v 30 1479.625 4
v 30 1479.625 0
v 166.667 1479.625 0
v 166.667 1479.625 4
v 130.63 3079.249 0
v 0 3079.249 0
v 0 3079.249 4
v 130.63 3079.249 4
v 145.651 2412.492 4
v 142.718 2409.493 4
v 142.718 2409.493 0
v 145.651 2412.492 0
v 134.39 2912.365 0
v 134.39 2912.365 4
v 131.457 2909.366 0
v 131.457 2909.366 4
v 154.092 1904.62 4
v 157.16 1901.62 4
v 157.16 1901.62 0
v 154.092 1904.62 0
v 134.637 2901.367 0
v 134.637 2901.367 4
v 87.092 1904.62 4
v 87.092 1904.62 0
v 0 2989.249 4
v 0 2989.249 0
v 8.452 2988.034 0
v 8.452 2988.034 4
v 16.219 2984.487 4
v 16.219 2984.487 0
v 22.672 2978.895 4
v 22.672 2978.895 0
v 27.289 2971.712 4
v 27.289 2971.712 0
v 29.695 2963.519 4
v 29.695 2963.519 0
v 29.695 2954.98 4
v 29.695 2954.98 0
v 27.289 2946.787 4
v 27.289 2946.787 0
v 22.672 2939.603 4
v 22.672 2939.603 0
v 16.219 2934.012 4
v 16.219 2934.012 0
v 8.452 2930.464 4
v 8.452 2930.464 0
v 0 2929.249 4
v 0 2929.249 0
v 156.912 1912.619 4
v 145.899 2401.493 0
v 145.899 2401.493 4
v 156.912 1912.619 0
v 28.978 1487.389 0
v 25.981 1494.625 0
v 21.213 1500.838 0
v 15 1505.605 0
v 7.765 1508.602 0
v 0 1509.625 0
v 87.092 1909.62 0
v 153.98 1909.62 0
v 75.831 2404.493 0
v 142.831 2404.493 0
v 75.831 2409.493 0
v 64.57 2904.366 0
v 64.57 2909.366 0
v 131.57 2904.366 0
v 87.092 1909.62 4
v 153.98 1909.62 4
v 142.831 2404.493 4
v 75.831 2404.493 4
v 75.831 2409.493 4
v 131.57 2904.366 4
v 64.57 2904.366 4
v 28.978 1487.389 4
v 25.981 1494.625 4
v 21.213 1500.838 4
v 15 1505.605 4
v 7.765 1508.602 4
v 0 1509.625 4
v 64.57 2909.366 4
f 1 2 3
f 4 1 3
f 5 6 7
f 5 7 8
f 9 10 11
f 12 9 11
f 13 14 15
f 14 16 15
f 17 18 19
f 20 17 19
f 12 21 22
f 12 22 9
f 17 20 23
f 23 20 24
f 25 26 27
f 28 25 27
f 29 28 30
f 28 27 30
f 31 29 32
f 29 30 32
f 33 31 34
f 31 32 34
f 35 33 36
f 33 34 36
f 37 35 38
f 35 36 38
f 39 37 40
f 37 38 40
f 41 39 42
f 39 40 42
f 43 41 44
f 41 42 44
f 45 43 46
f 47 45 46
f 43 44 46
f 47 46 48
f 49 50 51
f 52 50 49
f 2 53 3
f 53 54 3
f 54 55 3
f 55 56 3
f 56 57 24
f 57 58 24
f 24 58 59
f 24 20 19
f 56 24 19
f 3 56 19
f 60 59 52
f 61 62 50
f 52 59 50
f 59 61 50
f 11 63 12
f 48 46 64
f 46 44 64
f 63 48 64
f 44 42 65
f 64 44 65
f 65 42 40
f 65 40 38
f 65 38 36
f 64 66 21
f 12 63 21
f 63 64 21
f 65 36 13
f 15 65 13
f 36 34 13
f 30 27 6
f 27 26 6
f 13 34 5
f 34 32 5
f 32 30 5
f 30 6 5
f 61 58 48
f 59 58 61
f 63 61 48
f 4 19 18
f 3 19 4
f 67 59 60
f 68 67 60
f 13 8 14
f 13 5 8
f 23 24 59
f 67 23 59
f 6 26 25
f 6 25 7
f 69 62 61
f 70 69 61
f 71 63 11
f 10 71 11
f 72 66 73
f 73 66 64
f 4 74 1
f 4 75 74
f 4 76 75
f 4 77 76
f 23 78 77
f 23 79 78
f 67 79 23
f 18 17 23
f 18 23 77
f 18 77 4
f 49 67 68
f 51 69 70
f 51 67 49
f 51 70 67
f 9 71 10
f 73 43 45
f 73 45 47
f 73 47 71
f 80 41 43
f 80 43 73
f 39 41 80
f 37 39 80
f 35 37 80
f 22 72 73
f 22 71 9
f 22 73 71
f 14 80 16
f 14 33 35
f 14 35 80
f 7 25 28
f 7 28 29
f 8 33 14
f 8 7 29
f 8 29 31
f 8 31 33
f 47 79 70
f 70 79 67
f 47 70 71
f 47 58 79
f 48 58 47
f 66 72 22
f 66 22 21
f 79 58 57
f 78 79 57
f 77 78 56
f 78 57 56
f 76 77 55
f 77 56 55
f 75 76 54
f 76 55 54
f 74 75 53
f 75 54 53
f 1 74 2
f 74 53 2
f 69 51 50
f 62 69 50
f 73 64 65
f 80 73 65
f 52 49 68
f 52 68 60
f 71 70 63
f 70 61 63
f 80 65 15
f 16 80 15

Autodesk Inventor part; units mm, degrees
ref_plane "YZ Plane" through (0, 0, 0) normal (1, 0, 0) x (0, 1, 0)
ref_plane "XZ Plane" through (0, 0, 0) normal (0, 1, 0) x (-1, 0, 0)
ref_plane "XY Plane" through (0, 0, 0) normal (0, 0, 1) x (1, 0, 0)
sketch "Sketch1" plane through (0, 0, 0) normal (0, 0, 1) x (1, 0, 0)
  line L0 (0, 0) -> (0, 4438.8737)
  line L1 (0, 4438.8737) -> (100, 4438.8737)
  line L2 (100, 4438.8737) -> (200, 0)
  line L3 (200, 0) -> (0, 0)
  circle A0 centre (0, 0) radius 30
  line L4 (0, 1479.6246) -> (166.6667, 1479.6246)
  line L5 (0, 2959.2492) -> (133.3333, 2959.2492)
  circle A1 centre (0, 1479.6246) radius 30
  circle A2 centre (0, 2959.2492) radius 30
  line L6 (190.8761, 405) -> (120.8761, 405)
  line L7 (120.8761, 405) -> (120.8761, 410)
  line L8 (120.8761, 410) -> (190.8761, 410)
  line L9 (190.8761, 410) -> (190.8761, 405)
  line L10 (109.6148, 909.8732) -> (179.6148, 909.8732)
  line L11 (179.6148, 904.8732) -> (109.6148, 904.8732)
  line L12 (109.6148, 904.8732) -> (109.6148, 909.8732)
  line L13 (179.6148, 909.8732) -> (179.6148, 904.8732)
  line L14 (98.3535, 1409.7463) -> (168.3535, 1409.7463)
  line L15 (168.3535, 1404.7463) -> (98.3535, 1404.7463)
  line L16 (98.3535, 1404.7463) -> (98.3535, 1409.7463)
  line L17 (168.3535, 1409.7463) -> (168.3535, 1404.7463)
  line L18 (87.0923, 1909.6195) -> (157.0923, 1909.6195)
  line L19 (157.0923, 1904.6195) -> (87.0923, 1904.6195)
  line L20 (87.0923, 1904.6195) -> (87.0923, 1909.6195)
  line L21 (157.0923, 1909.6195) -> (157.0923, 1904.6195)
  line L22 (75.831, 2409.4927) -> (145.831, 2409.4927)
  line L23 (145.831, 2404.4927) -> (75.831, 2404.4927)
  line L24 (75.831, 2404.4927) -> (75.831, 2409.4927)
  line L25 (145.831, 2409.4927) -> (145.831, 2404.4927)
  line L26 (64.5698, 2909.3658) -> (134.5698, 2909.3658)
  line L27 (134.5698, 2904.3658) -> (64.5698, 2904.3658)
  line L28 (64.5698, 2904.3658) -> (64.5698, 2909.3658)
  line L29 (134.5698, 2909.3658) -> (134.5698, 2904.3658)
  line L30 (53.3085, 3409.239) -> (123.3085, 3409.239)
  line L31 (123.3085, 3404.239) -> (53.3085, 3404.239)
  line L32 (53.3085, 3404.239) -> (53.3085, 3409.239)
  line L33 (123.3085, 3409.239) -> (123.3085, 3404.239)
  line L34 (42.0472, 3909.1122) -> (112.0472, 3909.1122)
  line L35 (112.0472, 3904.1122) -> (42.0472, 3904.1122)
  line L36 (42.0472, 3904.1122) -> (42.0472, 3909.1122)
  line L37 (112.0472, 3909.1122) -> (112.0472, 3904.1122)
  line L38 (0, 1629.6246) -> (163.2874, 1629.6246)
  line L39 (0, 3079.2492) -> (130.6299, 3079.2492)
  point P0 (30, 2959.2492)
  point P1 (0, 2929.2492)
  point P2 (0, 1509.6246)
  point P3 (0, 1449.6246)
  point P4 (0, 30)
  point P5 (30, 0)
  point P6 (190.7634, 410)
  point P7 (179.5022, 909.8732)
  point P8 (168.3535, 1404.7463)
  point P9 (168.2409, 1409.7463)
  point P10 (30, 1479.6246)
  point P11 (157.0923, 1904.6195)
  point P12 (156.9796, 1909.6195)
  point P13 (145.831, 2404.4927)
  point P14 (145.7184, 2409.4927)
  point P15 (134.5698, 2904.3658)
  point P16 (134.4571, 2909.3658)
  point P17 (0, 2989.2492)
  dimension "d65" = 100
  dimension "d67" = 200
  dimension "d68" = 60
  dimension "d69" = 1480
  dimension "d70" = 1480
  dimension "d71" = 1480
  dimension "d72" = 5
  dimension "d73" = 70
  dimension "d74" = 410
  dimension "d77" = 500
  dimension "d82" = 120
  dimension "d83" = 150
extrude "Plate3" add sketch "Sketch1" along normal blind 4 contours L39 L2 L5 A2 L0 | L5 L2 L26 L28 L27 L22 L24 L23 L18 L20 L19 L38 L0 A2 | L38 L2 L4 A1 L0
chamfer "Corner Chamfer2" distance 3 angle 45 6 edges at (157.0923, 1904.6195, 2) (156.9796, 1909.6195, 2) (145.831, 2404.4927, 2) (145.7184, 2409.4927, 2) (134.5698, 2904.3658, 2) (134.4571, 2909.3658, 2)
equation "\"BendRadius\" = Thickness"
equation "\"BendReliefWidth\" = Thickness"
equation "\"BendReliefDepth\" = 0.5 * Thickness"
equation "\"CornerReliefSize\" = 4 * Thickness"
equation "\"MinimumRemnant\" = 2 * Thickness"
equation "\"TransitionRadius\" = BendRadius"
equation "\"JacobiRadiusSize\" = BendRadius"
equation "\"GapSize\" = Thickness"
equation "\"Thickness\" = 4"
properties part number "GBK 3212 central second rib_CPY" material "Steel"
